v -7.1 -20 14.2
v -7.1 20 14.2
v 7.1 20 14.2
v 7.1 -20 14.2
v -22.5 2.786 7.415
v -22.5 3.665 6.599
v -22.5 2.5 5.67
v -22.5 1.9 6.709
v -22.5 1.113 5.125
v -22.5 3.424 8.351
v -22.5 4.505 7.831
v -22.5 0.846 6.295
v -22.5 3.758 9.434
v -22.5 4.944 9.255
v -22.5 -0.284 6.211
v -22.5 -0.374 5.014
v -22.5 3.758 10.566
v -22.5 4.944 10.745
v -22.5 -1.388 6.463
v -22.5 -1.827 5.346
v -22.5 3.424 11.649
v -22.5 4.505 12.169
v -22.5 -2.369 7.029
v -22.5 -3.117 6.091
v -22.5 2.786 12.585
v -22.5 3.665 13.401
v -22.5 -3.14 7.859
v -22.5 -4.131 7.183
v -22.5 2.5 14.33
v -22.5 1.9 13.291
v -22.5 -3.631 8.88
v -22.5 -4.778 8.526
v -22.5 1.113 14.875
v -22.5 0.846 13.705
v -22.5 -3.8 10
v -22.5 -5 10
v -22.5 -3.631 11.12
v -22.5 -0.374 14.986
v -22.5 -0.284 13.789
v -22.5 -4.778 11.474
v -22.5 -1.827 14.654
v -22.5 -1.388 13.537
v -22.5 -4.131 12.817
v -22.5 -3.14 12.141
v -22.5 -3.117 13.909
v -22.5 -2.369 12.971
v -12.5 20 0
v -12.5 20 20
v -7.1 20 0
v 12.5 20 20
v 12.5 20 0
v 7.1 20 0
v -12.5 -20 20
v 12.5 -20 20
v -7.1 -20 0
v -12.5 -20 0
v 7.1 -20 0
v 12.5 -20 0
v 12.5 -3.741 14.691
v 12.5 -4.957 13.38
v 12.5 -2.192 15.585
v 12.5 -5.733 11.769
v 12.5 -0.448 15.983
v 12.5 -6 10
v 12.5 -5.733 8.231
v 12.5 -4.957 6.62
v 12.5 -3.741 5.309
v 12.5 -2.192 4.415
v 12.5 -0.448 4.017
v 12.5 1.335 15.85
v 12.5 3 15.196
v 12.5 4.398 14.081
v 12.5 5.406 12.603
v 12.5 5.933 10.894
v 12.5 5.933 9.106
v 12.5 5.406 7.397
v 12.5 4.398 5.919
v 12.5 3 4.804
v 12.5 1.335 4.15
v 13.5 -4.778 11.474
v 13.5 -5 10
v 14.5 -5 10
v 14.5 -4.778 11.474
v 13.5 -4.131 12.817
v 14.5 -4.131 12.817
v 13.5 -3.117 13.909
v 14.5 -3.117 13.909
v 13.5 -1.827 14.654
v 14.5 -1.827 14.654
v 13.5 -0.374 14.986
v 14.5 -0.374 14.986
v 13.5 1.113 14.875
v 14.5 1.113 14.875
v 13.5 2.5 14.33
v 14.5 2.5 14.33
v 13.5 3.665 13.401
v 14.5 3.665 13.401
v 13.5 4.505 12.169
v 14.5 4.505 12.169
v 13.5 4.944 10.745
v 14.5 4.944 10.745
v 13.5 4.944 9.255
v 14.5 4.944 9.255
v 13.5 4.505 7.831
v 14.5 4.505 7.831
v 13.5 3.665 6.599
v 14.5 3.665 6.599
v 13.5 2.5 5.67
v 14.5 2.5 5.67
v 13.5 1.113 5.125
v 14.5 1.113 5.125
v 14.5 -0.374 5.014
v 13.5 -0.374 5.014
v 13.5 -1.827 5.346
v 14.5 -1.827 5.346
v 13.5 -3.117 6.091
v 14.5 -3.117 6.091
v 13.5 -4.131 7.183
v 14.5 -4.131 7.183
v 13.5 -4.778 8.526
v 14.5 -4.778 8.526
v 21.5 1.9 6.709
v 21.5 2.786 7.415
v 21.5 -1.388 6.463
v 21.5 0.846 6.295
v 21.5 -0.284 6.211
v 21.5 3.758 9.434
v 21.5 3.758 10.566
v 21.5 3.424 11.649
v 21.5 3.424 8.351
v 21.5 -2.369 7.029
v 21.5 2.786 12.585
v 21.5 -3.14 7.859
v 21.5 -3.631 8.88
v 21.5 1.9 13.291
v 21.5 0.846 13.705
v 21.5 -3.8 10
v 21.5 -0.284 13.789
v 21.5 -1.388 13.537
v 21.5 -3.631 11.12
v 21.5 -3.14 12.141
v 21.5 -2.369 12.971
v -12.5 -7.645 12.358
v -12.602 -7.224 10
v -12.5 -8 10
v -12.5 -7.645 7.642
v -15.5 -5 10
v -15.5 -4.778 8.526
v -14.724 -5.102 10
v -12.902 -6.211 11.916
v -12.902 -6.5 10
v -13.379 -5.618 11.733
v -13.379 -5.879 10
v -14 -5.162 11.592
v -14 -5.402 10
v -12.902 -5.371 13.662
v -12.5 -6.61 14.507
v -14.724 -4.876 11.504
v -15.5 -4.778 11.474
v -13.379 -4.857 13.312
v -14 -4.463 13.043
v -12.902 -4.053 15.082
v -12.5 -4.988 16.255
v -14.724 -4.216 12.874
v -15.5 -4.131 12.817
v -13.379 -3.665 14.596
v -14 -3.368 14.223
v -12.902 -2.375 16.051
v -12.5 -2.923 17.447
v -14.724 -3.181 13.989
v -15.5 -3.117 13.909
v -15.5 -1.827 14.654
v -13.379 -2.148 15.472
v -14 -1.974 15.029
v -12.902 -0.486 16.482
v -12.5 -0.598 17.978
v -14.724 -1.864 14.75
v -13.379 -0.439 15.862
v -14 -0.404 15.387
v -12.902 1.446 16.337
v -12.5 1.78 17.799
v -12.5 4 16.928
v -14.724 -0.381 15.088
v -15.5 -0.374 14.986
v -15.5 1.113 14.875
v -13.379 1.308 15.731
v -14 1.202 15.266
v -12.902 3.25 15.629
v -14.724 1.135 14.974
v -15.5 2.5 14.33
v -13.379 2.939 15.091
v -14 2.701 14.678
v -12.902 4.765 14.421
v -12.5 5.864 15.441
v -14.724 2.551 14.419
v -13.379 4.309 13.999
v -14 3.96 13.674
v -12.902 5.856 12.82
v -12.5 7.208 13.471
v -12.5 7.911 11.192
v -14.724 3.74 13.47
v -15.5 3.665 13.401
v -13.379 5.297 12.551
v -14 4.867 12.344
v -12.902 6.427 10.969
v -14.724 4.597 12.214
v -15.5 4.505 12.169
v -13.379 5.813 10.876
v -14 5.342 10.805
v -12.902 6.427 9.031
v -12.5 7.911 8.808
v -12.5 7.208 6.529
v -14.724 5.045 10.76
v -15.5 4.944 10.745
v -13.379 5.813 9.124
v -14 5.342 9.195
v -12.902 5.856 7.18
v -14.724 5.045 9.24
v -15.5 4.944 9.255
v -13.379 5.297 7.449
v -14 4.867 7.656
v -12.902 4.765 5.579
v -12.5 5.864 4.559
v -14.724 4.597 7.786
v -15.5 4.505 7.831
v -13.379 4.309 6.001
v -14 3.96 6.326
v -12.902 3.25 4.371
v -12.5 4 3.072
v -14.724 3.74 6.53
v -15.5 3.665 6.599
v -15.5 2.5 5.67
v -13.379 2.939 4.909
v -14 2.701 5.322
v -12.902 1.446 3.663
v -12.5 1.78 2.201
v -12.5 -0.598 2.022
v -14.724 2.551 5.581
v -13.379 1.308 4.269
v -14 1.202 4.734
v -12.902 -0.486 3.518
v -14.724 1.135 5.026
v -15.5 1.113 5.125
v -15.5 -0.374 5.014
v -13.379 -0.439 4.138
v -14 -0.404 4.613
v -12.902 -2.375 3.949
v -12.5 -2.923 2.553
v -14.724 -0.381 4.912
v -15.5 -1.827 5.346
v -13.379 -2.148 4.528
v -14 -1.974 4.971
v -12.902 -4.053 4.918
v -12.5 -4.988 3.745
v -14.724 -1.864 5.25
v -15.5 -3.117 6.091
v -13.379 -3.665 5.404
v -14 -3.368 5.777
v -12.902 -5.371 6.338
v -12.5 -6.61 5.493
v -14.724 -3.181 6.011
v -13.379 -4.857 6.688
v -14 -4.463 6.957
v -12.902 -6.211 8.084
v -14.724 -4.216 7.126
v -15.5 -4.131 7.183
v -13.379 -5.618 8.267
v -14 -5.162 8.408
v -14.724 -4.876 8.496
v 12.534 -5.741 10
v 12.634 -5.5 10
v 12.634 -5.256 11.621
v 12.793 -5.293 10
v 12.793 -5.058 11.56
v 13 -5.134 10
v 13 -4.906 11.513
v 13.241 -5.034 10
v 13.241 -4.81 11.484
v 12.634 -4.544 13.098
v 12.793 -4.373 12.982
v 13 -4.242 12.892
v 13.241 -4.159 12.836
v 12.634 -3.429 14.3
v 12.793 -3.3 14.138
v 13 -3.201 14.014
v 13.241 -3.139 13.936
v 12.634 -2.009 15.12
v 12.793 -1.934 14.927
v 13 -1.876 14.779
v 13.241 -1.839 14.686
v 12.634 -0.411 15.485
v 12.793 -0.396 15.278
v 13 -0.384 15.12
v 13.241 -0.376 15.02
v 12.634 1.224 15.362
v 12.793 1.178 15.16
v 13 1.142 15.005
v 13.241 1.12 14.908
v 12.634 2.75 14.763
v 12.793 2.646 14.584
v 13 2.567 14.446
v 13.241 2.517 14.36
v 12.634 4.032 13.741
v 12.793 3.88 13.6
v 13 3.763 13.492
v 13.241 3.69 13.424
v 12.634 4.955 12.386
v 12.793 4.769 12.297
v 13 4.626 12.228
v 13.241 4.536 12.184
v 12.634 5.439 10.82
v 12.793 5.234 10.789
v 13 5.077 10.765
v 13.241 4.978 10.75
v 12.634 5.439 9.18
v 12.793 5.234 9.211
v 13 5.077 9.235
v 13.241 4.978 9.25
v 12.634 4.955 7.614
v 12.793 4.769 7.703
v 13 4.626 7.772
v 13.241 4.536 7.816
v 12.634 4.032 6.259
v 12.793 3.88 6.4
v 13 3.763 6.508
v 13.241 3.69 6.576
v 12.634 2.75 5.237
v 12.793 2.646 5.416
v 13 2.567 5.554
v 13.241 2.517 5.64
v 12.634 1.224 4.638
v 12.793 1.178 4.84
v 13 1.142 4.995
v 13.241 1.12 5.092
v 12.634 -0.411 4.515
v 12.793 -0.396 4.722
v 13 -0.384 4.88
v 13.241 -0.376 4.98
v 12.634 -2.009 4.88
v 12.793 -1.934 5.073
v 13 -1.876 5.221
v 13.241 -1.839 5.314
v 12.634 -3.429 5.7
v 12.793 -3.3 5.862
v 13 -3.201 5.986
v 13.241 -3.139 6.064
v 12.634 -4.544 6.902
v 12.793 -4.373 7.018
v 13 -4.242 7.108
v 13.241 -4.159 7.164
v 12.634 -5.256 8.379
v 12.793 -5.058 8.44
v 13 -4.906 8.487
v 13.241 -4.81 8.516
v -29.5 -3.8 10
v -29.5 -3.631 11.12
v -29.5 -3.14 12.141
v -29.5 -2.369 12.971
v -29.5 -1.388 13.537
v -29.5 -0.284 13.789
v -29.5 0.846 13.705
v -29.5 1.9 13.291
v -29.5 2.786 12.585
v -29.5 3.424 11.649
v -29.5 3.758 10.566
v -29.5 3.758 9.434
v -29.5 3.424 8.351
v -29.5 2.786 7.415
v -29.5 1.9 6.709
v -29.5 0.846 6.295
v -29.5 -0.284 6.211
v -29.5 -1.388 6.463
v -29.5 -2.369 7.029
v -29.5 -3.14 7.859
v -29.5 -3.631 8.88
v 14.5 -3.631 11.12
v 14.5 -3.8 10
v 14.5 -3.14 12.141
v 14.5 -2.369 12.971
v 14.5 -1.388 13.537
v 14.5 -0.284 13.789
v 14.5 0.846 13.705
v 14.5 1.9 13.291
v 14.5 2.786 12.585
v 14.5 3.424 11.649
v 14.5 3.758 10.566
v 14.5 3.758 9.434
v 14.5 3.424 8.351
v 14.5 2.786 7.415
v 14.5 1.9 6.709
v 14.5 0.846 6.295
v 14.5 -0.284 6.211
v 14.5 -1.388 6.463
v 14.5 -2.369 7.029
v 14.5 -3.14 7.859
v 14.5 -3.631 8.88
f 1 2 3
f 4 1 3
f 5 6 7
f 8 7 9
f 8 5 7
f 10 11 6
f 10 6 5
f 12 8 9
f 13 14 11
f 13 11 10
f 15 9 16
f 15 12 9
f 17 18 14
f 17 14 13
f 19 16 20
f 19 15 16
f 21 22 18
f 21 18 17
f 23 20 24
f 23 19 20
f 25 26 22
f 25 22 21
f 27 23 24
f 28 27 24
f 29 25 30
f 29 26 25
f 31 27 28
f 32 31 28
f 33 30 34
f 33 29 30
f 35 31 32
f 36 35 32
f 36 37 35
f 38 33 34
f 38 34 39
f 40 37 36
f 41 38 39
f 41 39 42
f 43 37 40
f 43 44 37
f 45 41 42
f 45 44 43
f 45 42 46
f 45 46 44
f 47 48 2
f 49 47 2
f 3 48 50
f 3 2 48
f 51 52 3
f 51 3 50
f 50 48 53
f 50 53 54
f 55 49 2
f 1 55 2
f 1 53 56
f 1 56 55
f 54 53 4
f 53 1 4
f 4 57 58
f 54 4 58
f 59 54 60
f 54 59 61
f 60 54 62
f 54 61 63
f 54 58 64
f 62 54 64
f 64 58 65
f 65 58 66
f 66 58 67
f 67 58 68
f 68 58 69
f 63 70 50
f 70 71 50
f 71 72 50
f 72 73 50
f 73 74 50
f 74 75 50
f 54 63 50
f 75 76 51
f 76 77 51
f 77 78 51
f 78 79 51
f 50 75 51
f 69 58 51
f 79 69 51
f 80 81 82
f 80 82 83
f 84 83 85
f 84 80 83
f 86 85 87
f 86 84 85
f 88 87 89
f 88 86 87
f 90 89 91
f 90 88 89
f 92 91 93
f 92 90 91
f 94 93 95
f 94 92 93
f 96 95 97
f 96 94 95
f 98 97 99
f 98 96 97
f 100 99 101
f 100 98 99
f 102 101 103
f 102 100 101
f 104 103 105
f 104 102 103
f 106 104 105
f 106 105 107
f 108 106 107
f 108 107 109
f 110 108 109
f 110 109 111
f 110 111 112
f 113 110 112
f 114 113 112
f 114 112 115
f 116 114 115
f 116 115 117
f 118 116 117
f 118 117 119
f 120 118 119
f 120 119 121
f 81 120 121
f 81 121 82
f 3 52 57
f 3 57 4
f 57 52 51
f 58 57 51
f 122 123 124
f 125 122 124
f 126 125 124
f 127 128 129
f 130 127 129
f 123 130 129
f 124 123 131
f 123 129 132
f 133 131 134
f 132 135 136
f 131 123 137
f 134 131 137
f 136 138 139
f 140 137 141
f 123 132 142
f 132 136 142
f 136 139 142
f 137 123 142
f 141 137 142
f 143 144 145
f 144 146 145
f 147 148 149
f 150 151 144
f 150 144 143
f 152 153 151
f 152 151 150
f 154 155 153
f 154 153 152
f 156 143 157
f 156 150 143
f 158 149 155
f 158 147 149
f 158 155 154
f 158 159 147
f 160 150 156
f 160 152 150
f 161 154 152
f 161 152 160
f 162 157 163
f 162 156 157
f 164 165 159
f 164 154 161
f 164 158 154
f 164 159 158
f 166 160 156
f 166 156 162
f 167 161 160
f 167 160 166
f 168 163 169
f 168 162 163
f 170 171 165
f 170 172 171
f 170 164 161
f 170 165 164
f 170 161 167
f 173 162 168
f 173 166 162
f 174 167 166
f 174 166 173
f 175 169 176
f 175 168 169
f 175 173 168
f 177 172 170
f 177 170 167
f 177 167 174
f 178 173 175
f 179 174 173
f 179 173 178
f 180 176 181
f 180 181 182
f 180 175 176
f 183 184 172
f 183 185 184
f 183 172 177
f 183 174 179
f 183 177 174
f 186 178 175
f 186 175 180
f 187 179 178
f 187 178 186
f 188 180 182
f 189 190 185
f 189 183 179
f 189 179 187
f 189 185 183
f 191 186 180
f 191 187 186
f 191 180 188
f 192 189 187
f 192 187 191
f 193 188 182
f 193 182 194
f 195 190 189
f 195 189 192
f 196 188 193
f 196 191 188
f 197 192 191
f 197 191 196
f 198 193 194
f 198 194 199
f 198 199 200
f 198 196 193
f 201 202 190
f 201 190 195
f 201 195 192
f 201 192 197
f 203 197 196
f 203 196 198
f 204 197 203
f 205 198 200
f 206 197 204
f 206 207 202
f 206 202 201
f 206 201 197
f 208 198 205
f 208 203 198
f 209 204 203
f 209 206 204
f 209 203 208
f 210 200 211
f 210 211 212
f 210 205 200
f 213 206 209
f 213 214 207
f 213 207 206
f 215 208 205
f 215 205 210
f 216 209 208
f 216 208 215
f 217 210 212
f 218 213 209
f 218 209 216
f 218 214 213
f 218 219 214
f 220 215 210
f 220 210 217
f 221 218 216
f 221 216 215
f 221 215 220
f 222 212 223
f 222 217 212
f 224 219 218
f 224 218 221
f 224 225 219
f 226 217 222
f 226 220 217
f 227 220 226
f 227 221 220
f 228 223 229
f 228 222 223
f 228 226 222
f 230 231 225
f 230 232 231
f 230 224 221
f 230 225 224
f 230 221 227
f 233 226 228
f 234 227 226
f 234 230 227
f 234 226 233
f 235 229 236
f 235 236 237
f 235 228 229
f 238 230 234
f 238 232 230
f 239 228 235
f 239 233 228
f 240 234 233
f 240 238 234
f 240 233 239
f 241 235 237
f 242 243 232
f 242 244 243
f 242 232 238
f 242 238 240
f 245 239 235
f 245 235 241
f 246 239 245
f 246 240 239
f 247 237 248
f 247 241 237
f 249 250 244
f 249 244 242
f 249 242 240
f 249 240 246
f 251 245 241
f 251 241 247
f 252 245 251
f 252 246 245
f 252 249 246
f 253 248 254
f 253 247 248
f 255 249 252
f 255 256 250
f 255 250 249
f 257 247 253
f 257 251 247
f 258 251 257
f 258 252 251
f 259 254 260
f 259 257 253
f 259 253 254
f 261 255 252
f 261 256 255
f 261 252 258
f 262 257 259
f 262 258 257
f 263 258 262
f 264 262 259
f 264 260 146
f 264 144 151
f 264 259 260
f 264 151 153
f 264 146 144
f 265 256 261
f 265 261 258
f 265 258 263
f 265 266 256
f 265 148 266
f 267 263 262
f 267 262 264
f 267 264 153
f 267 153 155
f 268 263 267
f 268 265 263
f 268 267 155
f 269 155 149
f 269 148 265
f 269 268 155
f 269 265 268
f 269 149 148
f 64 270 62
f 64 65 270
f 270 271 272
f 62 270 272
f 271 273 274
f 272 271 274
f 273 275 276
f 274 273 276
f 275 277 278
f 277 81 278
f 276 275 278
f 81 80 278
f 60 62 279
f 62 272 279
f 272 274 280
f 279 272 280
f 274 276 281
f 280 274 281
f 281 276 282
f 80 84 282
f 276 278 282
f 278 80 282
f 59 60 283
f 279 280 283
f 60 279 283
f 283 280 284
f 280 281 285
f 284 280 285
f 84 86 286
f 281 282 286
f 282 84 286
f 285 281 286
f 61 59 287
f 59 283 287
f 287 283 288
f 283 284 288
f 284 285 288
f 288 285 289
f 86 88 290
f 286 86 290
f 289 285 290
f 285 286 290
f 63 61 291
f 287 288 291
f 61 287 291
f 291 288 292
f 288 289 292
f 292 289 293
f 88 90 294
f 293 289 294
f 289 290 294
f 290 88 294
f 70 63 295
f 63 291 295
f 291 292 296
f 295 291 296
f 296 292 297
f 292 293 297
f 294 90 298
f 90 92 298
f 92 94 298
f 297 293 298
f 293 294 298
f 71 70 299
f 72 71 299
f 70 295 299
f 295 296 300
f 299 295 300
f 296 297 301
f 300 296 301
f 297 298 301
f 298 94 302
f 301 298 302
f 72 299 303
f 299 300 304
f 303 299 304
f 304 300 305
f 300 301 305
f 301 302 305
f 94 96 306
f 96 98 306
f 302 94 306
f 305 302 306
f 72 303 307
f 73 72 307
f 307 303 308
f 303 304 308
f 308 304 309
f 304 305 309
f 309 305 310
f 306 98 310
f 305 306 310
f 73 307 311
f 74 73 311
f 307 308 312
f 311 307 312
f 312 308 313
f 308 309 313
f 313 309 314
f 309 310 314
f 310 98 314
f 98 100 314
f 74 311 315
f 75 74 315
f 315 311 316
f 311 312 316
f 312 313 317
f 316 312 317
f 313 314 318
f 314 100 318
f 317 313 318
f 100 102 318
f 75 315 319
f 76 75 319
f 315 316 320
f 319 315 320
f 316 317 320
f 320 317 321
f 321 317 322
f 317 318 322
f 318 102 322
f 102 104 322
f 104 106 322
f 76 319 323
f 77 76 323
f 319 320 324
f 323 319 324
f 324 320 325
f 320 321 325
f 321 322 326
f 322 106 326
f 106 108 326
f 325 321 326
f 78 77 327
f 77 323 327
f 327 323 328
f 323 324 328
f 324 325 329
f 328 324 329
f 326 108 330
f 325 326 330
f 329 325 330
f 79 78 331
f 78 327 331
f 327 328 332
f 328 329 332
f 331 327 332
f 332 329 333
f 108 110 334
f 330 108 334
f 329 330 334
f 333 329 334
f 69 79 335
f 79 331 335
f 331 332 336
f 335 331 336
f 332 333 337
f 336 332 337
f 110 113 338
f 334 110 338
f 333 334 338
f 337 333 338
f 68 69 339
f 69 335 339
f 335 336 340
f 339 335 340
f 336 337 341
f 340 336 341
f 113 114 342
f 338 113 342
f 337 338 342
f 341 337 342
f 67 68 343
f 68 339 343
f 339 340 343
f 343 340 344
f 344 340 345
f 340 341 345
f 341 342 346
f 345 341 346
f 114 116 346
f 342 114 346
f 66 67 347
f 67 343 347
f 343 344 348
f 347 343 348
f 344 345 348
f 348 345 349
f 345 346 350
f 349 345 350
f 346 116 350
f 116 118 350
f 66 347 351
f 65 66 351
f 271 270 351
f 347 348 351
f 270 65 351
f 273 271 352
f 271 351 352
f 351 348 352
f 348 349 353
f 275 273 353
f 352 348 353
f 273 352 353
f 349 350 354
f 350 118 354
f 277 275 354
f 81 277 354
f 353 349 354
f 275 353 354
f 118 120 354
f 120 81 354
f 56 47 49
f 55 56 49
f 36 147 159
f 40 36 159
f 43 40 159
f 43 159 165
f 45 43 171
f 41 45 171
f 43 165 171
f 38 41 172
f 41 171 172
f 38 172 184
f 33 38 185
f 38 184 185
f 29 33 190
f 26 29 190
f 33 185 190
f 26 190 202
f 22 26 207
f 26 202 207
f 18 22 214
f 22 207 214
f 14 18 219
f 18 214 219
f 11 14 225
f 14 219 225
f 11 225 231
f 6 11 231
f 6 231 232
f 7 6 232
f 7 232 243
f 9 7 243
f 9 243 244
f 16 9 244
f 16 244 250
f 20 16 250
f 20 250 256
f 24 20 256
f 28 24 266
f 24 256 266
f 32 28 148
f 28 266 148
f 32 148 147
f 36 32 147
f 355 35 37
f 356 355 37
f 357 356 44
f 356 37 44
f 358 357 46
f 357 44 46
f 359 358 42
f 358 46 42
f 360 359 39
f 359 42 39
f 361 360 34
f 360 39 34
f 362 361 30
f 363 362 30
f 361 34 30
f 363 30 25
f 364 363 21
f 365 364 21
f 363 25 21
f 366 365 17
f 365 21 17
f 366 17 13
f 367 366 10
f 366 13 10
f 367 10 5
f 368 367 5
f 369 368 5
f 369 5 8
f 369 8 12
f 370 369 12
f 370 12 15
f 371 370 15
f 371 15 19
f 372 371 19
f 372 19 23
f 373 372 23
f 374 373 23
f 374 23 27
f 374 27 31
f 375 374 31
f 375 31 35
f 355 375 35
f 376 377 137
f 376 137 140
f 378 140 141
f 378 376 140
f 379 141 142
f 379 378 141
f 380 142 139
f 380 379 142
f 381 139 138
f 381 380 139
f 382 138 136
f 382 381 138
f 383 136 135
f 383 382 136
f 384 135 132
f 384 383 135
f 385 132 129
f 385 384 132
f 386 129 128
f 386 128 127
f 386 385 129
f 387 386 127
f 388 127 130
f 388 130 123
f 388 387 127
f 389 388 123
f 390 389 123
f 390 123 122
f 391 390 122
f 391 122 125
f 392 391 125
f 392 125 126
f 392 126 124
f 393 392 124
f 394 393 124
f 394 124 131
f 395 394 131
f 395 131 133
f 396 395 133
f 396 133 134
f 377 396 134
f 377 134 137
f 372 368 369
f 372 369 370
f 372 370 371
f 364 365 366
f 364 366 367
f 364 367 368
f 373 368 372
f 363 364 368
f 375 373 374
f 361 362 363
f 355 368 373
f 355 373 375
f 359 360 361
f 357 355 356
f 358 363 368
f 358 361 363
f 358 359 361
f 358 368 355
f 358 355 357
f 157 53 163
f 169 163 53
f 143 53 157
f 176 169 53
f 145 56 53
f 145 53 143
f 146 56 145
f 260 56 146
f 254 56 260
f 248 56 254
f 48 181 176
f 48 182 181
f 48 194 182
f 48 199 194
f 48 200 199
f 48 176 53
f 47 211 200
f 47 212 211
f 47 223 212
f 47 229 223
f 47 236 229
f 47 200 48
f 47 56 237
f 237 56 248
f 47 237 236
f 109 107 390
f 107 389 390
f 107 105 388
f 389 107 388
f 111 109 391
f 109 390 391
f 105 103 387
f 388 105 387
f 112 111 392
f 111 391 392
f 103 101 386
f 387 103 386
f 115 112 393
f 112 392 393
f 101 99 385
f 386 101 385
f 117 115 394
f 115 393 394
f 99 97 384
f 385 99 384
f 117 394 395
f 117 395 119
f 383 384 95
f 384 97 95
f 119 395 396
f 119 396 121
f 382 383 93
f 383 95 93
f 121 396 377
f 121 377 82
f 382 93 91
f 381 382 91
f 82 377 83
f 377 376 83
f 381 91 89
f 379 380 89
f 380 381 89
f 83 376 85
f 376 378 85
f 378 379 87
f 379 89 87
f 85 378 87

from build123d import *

# Parameters (mm, degrees)
SKETCH_W          = 25
SKETCH_H          = 40
PAD_DEPTH         = 20
SKETCH001_R       = 3.8
PAD001_DEPTH      = 17
PAD001_DEPTH_BACK = 34
SKETCH002_R       = 5
PAD002_DEPTH      = 10
PAD002_DEPTH_BACK = 27
SKETCH003_W       = 14.2
SKETCH003_H       = 14.2
POCKET_DEPTH      = 50
FILLET003_R       = 3
FILLET004_R       = 1


with BuildPart() as part:
    # Sketch → Pad (new body)
    with BuildSketch(Plane.XY):
        Rectangle(SKETCH_W, SKETCH_H)
    extrude(amount=PAD_DEPTH)

    # Sketch001 → Pad001 (new body, two sides)
    with BuildSketch(Plane(origin=(-12.5, 0, 0), x_dir=(0, -1, 0), z_dir=(-1, 0, 0))) as pad001_sk:
        with Locations((0, 10)):
            Circle(SKETCH001_R)
    extrude(amount=PAD001_DEPTH)
    extrude(pad001_sk.sketch, amount=-PAD001_DEPTH_BACK)

    # Sketch002 → Pad002 (new body, two sides)
    with BuildSketch(Plane(origin=(-12.5, 0, 0), x_dir=(0, -1, 0), z_dir=(-1, 0, 0))) as pad002_sk:
        with Locations((0, 10)):
            Circle(SKETCH002_R)
    extrude(amount=PAD002_DEPTH)
    extrude(pad002_sk.sketch, amount=-PAD002_DEPTH_BACK)

    # Sketch003 → Pocket (cut)
    with BuildSketch(Plane.XZ.offset(20)):
        with Locations((0, 7.1)):
            Rectangle(SKETCH003_W, SKETCH003_H)
    extrude(amount=-POCKET_DEPTH, mode=Mode.SUBTRACT)

    # Fillet003
    fillet003_edges = [part.edges().sort_by_distance(p)[0] for p in [
        (-12.5, 5, 10),
    ]]
    fillet(fillet003_edges, radius=FILLET003_R)

    # Fillet004
    fillet004_edges = [part.edges().sort_by_distance(p)[0] for p in [
        (12.5, 5, 10),
    ]]
    fillet(fillet004_edges, radius=FILLET004_R)


solid = part.part
